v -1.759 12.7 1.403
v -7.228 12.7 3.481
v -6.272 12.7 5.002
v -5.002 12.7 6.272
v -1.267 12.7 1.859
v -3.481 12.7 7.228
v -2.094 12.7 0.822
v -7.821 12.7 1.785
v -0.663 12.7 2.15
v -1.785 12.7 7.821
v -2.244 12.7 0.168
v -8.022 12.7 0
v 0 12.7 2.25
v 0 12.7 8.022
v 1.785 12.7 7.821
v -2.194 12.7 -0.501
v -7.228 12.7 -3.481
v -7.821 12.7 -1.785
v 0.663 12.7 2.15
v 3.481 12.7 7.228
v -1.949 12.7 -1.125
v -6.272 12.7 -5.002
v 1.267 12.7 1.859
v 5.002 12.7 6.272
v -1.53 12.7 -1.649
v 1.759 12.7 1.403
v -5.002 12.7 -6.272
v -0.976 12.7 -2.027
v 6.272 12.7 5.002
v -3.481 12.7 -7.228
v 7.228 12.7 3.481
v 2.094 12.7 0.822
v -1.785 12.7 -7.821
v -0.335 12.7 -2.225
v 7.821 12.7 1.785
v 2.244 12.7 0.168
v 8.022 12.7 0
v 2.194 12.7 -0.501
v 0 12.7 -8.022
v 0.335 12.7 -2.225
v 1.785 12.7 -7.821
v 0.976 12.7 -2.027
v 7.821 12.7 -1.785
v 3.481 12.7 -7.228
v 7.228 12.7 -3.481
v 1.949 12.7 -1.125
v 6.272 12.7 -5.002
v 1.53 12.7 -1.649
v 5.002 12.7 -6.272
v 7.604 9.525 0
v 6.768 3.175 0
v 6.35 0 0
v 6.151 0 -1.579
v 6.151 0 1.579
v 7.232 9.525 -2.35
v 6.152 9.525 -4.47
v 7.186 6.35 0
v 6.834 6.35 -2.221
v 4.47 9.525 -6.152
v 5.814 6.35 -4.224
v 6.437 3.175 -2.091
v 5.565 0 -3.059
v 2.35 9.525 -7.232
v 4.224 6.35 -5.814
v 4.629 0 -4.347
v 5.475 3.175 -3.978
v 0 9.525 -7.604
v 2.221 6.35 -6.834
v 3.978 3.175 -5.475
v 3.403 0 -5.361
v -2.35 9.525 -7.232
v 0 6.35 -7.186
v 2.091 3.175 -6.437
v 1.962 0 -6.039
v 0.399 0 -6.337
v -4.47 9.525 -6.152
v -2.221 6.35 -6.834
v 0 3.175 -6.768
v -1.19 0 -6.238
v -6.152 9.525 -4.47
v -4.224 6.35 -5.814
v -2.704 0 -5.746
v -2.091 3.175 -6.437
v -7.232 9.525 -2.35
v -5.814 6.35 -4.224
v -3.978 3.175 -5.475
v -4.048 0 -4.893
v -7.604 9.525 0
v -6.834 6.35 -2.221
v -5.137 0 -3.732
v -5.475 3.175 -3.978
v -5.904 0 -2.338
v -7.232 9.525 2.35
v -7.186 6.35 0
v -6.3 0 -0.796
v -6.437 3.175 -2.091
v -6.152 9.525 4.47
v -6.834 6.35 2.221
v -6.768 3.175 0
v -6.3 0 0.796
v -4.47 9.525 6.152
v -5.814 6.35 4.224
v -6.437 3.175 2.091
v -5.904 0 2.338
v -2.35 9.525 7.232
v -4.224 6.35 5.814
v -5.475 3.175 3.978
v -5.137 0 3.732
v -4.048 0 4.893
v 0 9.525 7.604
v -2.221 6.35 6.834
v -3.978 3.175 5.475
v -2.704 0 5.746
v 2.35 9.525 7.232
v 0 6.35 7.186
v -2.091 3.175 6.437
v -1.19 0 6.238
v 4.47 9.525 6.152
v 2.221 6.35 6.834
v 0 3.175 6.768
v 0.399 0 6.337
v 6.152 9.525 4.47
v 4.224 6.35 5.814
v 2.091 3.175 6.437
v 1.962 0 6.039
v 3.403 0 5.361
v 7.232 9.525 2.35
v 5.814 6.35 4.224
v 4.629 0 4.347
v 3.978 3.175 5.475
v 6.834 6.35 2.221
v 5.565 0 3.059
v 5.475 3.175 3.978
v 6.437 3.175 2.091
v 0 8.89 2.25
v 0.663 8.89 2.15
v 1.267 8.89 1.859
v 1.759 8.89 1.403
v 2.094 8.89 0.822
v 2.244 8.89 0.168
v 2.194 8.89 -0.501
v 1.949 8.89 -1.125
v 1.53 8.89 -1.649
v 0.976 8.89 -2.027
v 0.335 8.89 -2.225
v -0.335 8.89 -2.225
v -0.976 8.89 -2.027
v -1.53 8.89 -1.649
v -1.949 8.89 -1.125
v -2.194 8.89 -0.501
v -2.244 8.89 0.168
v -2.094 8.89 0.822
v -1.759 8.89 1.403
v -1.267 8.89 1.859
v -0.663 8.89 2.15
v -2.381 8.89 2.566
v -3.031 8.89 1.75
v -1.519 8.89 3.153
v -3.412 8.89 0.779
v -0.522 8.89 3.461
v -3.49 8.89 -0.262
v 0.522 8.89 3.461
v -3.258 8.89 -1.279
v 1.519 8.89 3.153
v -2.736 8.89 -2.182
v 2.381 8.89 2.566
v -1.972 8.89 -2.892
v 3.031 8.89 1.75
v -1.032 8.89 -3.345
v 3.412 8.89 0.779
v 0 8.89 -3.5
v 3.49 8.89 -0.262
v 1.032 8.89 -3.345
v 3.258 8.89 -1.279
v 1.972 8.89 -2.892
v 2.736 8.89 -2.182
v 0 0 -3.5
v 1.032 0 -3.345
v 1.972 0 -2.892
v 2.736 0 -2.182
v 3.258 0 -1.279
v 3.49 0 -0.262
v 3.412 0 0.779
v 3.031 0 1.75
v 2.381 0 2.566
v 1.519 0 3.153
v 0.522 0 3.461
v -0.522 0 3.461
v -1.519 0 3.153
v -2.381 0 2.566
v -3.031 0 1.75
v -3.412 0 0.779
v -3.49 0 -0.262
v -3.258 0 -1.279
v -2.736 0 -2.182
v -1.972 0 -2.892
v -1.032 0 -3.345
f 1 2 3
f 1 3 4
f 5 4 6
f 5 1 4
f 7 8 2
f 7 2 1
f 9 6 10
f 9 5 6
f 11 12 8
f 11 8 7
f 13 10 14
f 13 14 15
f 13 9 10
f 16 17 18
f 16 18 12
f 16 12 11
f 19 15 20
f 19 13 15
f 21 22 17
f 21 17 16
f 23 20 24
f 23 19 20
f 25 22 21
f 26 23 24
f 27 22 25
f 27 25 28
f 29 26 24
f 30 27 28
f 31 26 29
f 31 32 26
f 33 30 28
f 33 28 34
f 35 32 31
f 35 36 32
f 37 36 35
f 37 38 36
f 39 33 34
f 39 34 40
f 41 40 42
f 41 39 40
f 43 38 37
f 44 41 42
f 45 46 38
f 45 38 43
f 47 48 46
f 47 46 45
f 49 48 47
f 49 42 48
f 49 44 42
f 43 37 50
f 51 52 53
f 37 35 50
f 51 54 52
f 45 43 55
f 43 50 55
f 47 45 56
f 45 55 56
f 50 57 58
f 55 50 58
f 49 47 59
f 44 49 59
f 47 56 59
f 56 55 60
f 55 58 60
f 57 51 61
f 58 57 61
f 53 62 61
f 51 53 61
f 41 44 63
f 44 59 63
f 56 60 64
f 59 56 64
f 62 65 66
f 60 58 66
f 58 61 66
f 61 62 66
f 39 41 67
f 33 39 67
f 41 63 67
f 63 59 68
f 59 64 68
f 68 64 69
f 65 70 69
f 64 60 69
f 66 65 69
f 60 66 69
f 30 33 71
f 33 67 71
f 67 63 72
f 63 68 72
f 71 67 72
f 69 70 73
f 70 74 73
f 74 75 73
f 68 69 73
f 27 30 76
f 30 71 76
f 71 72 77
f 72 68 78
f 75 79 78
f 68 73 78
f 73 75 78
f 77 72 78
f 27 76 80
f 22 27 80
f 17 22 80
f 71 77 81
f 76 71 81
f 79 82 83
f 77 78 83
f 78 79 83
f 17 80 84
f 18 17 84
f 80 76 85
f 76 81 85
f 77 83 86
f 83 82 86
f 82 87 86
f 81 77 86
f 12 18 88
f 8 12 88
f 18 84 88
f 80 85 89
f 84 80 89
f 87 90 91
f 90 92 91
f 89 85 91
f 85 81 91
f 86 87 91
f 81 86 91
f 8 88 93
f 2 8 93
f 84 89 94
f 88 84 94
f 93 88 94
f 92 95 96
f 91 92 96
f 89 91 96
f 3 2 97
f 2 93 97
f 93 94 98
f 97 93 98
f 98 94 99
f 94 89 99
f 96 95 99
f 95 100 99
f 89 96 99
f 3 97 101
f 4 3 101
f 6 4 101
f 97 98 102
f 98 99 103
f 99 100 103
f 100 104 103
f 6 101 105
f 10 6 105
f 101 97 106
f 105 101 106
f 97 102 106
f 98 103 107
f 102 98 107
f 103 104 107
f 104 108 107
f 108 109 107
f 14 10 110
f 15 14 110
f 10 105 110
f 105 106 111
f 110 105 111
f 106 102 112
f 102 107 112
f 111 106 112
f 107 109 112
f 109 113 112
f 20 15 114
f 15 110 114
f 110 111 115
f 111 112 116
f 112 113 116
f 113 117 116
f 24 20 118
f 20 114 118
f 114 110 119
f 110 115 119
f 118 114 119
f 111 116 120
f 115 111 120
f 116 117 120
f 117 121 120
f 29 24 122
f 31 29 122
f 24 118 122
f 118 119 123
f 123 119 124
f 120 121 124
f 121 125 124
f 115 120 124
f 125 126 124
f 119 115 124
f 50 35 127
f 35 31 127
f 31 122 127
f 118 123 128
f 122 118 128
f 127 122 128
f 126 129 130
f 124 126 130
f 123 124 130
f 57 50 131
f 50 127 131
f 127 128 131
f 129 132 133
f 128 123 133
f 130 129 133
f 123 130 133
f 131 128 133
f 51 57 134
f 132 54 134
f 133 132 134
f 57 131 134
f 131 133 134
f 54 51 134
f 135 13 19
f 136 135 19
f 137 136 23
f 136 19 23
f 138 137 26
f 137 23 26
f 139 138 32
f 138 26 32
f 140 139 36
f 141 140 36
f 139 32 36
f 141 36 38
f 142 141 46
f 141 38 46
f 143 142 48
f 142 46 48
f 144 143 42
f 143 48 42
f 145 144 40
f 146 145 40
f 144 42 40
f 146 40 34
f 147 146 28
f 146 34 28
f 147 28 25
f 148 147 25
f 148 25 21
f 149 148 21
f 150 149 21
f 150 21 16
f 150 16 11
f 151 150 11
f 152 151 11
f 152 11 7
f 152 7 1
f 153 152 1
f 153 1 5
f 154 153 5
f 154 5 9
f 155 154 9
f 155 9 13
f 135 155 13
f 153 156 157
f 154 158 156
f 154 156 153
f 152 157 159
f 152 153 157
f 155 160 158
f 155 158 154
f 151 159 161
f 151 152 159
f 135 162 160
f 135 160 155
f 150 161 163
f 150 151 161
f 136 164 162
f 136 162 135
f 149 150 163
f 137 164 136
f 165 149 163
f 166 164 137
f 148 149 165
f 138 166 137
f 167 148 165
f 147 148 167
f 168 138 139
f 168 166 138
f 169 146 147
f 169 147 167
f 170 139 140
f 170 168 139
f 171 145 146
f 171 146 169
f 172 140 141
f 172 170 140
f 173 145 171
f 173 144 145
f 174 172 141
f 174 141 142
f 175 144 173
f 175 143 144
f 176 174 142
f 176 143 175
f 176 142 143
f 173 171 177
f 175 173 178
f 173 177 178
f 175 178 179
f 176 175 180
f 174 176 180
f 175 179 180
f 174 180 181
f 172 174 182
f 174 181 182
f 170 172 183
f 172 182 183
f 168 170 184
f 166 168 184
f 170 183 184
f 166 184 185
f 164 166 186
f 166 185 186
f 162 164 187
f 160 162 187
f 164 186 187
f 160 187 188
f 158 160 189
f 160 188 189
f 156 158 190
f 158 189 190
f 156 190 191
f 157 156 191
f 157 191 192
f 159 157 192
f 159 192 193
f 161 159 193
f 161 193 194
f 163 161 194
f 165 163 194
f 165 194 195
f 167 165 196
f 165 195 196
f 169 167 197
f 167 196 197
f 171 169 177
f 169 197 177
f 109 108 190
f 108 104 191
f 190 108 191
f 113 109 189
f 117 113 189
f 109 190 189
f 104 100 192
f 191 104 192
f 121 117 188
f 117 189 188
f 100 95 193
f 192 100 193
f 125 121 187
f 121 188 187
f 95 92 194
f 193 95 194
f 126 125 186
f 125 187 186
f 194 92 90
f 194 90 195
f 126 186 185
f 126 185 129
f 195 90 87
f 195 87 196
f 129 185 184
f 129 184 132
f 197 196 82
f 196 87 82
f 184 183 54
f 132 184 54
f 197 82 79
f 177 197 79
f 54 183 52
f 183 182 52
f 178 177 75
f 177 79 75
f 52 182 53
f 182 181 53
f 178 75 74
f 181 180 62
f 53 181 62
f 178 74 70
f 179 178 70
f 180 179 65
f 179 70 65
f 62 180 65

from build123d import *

# Parameters (mm, degrees)
SKETCH1_R           = 6.35
BOSS_EXTRUDE1_DEPTH = 12.7
BOSS_EXTRUDE1_DRAFT = -7.5
SKETCH2_R           = 3.5
CUT_EXTRUDE1_DEPTH  = 8.89
SKETCH3_R           = 2.25
CUT_EXTRUDE2_DEPTH  = 18.029226108


with BuildPart() as part:
    # Sketch1 → Boss-Extrude1 (with draft: the straight prism first)
    with BuildSketch(Plane(origin=(0, 0, 0), x_dir=(1, 0, 0), z_dir=(0, 1, 0))):
        Circle(SKETCH1_R)
    extrude(amount=BOSS_EXTRUDE1_DEPTH)
    # Boss-Extrude1: the draft: its side faces are tilted about the plane it starts from
    boss_extrude1_sides = [part.faces().sort_by_distance(p)[0] for p in [
        (-6.35, 6.35, 0),
    ]]
    draft(boss_extrude1_sides, Plane(origin=(0, 0, 0), x_dir=(1, 0, 0), z_dir=(0, 1, 0)), BOSS_EXTRUDE1_DRAFT)

    # Sketch2 → Cut-Extrude1 (cut)
    with BuildSketch(Plane.XZ):
        with Locations(Location((0, 0, 0), (0, 0, 270))):
            Circle(SKETCH2_R)
    extrude(amount=-CUT_EXTRUDE1_DEPTH, mode=Mode.SUBTRACT)

    # Sketch3 → Cut-Extrude2 (cut, through all)
    with BuildSketch(Plane(origin=(0, 12.7, 0), x_dir=(1, 0, 0), z_dir=(0, 1, 0))):
        with Locations(Location((0, 0, 0), (0, 0, 270))):
            Circle(SKETCH3_R)
    extrude(amount=-CUT_EXTRUDE2_DEPTH, mode=Mode.SUBTRACT)


solid = part.part
